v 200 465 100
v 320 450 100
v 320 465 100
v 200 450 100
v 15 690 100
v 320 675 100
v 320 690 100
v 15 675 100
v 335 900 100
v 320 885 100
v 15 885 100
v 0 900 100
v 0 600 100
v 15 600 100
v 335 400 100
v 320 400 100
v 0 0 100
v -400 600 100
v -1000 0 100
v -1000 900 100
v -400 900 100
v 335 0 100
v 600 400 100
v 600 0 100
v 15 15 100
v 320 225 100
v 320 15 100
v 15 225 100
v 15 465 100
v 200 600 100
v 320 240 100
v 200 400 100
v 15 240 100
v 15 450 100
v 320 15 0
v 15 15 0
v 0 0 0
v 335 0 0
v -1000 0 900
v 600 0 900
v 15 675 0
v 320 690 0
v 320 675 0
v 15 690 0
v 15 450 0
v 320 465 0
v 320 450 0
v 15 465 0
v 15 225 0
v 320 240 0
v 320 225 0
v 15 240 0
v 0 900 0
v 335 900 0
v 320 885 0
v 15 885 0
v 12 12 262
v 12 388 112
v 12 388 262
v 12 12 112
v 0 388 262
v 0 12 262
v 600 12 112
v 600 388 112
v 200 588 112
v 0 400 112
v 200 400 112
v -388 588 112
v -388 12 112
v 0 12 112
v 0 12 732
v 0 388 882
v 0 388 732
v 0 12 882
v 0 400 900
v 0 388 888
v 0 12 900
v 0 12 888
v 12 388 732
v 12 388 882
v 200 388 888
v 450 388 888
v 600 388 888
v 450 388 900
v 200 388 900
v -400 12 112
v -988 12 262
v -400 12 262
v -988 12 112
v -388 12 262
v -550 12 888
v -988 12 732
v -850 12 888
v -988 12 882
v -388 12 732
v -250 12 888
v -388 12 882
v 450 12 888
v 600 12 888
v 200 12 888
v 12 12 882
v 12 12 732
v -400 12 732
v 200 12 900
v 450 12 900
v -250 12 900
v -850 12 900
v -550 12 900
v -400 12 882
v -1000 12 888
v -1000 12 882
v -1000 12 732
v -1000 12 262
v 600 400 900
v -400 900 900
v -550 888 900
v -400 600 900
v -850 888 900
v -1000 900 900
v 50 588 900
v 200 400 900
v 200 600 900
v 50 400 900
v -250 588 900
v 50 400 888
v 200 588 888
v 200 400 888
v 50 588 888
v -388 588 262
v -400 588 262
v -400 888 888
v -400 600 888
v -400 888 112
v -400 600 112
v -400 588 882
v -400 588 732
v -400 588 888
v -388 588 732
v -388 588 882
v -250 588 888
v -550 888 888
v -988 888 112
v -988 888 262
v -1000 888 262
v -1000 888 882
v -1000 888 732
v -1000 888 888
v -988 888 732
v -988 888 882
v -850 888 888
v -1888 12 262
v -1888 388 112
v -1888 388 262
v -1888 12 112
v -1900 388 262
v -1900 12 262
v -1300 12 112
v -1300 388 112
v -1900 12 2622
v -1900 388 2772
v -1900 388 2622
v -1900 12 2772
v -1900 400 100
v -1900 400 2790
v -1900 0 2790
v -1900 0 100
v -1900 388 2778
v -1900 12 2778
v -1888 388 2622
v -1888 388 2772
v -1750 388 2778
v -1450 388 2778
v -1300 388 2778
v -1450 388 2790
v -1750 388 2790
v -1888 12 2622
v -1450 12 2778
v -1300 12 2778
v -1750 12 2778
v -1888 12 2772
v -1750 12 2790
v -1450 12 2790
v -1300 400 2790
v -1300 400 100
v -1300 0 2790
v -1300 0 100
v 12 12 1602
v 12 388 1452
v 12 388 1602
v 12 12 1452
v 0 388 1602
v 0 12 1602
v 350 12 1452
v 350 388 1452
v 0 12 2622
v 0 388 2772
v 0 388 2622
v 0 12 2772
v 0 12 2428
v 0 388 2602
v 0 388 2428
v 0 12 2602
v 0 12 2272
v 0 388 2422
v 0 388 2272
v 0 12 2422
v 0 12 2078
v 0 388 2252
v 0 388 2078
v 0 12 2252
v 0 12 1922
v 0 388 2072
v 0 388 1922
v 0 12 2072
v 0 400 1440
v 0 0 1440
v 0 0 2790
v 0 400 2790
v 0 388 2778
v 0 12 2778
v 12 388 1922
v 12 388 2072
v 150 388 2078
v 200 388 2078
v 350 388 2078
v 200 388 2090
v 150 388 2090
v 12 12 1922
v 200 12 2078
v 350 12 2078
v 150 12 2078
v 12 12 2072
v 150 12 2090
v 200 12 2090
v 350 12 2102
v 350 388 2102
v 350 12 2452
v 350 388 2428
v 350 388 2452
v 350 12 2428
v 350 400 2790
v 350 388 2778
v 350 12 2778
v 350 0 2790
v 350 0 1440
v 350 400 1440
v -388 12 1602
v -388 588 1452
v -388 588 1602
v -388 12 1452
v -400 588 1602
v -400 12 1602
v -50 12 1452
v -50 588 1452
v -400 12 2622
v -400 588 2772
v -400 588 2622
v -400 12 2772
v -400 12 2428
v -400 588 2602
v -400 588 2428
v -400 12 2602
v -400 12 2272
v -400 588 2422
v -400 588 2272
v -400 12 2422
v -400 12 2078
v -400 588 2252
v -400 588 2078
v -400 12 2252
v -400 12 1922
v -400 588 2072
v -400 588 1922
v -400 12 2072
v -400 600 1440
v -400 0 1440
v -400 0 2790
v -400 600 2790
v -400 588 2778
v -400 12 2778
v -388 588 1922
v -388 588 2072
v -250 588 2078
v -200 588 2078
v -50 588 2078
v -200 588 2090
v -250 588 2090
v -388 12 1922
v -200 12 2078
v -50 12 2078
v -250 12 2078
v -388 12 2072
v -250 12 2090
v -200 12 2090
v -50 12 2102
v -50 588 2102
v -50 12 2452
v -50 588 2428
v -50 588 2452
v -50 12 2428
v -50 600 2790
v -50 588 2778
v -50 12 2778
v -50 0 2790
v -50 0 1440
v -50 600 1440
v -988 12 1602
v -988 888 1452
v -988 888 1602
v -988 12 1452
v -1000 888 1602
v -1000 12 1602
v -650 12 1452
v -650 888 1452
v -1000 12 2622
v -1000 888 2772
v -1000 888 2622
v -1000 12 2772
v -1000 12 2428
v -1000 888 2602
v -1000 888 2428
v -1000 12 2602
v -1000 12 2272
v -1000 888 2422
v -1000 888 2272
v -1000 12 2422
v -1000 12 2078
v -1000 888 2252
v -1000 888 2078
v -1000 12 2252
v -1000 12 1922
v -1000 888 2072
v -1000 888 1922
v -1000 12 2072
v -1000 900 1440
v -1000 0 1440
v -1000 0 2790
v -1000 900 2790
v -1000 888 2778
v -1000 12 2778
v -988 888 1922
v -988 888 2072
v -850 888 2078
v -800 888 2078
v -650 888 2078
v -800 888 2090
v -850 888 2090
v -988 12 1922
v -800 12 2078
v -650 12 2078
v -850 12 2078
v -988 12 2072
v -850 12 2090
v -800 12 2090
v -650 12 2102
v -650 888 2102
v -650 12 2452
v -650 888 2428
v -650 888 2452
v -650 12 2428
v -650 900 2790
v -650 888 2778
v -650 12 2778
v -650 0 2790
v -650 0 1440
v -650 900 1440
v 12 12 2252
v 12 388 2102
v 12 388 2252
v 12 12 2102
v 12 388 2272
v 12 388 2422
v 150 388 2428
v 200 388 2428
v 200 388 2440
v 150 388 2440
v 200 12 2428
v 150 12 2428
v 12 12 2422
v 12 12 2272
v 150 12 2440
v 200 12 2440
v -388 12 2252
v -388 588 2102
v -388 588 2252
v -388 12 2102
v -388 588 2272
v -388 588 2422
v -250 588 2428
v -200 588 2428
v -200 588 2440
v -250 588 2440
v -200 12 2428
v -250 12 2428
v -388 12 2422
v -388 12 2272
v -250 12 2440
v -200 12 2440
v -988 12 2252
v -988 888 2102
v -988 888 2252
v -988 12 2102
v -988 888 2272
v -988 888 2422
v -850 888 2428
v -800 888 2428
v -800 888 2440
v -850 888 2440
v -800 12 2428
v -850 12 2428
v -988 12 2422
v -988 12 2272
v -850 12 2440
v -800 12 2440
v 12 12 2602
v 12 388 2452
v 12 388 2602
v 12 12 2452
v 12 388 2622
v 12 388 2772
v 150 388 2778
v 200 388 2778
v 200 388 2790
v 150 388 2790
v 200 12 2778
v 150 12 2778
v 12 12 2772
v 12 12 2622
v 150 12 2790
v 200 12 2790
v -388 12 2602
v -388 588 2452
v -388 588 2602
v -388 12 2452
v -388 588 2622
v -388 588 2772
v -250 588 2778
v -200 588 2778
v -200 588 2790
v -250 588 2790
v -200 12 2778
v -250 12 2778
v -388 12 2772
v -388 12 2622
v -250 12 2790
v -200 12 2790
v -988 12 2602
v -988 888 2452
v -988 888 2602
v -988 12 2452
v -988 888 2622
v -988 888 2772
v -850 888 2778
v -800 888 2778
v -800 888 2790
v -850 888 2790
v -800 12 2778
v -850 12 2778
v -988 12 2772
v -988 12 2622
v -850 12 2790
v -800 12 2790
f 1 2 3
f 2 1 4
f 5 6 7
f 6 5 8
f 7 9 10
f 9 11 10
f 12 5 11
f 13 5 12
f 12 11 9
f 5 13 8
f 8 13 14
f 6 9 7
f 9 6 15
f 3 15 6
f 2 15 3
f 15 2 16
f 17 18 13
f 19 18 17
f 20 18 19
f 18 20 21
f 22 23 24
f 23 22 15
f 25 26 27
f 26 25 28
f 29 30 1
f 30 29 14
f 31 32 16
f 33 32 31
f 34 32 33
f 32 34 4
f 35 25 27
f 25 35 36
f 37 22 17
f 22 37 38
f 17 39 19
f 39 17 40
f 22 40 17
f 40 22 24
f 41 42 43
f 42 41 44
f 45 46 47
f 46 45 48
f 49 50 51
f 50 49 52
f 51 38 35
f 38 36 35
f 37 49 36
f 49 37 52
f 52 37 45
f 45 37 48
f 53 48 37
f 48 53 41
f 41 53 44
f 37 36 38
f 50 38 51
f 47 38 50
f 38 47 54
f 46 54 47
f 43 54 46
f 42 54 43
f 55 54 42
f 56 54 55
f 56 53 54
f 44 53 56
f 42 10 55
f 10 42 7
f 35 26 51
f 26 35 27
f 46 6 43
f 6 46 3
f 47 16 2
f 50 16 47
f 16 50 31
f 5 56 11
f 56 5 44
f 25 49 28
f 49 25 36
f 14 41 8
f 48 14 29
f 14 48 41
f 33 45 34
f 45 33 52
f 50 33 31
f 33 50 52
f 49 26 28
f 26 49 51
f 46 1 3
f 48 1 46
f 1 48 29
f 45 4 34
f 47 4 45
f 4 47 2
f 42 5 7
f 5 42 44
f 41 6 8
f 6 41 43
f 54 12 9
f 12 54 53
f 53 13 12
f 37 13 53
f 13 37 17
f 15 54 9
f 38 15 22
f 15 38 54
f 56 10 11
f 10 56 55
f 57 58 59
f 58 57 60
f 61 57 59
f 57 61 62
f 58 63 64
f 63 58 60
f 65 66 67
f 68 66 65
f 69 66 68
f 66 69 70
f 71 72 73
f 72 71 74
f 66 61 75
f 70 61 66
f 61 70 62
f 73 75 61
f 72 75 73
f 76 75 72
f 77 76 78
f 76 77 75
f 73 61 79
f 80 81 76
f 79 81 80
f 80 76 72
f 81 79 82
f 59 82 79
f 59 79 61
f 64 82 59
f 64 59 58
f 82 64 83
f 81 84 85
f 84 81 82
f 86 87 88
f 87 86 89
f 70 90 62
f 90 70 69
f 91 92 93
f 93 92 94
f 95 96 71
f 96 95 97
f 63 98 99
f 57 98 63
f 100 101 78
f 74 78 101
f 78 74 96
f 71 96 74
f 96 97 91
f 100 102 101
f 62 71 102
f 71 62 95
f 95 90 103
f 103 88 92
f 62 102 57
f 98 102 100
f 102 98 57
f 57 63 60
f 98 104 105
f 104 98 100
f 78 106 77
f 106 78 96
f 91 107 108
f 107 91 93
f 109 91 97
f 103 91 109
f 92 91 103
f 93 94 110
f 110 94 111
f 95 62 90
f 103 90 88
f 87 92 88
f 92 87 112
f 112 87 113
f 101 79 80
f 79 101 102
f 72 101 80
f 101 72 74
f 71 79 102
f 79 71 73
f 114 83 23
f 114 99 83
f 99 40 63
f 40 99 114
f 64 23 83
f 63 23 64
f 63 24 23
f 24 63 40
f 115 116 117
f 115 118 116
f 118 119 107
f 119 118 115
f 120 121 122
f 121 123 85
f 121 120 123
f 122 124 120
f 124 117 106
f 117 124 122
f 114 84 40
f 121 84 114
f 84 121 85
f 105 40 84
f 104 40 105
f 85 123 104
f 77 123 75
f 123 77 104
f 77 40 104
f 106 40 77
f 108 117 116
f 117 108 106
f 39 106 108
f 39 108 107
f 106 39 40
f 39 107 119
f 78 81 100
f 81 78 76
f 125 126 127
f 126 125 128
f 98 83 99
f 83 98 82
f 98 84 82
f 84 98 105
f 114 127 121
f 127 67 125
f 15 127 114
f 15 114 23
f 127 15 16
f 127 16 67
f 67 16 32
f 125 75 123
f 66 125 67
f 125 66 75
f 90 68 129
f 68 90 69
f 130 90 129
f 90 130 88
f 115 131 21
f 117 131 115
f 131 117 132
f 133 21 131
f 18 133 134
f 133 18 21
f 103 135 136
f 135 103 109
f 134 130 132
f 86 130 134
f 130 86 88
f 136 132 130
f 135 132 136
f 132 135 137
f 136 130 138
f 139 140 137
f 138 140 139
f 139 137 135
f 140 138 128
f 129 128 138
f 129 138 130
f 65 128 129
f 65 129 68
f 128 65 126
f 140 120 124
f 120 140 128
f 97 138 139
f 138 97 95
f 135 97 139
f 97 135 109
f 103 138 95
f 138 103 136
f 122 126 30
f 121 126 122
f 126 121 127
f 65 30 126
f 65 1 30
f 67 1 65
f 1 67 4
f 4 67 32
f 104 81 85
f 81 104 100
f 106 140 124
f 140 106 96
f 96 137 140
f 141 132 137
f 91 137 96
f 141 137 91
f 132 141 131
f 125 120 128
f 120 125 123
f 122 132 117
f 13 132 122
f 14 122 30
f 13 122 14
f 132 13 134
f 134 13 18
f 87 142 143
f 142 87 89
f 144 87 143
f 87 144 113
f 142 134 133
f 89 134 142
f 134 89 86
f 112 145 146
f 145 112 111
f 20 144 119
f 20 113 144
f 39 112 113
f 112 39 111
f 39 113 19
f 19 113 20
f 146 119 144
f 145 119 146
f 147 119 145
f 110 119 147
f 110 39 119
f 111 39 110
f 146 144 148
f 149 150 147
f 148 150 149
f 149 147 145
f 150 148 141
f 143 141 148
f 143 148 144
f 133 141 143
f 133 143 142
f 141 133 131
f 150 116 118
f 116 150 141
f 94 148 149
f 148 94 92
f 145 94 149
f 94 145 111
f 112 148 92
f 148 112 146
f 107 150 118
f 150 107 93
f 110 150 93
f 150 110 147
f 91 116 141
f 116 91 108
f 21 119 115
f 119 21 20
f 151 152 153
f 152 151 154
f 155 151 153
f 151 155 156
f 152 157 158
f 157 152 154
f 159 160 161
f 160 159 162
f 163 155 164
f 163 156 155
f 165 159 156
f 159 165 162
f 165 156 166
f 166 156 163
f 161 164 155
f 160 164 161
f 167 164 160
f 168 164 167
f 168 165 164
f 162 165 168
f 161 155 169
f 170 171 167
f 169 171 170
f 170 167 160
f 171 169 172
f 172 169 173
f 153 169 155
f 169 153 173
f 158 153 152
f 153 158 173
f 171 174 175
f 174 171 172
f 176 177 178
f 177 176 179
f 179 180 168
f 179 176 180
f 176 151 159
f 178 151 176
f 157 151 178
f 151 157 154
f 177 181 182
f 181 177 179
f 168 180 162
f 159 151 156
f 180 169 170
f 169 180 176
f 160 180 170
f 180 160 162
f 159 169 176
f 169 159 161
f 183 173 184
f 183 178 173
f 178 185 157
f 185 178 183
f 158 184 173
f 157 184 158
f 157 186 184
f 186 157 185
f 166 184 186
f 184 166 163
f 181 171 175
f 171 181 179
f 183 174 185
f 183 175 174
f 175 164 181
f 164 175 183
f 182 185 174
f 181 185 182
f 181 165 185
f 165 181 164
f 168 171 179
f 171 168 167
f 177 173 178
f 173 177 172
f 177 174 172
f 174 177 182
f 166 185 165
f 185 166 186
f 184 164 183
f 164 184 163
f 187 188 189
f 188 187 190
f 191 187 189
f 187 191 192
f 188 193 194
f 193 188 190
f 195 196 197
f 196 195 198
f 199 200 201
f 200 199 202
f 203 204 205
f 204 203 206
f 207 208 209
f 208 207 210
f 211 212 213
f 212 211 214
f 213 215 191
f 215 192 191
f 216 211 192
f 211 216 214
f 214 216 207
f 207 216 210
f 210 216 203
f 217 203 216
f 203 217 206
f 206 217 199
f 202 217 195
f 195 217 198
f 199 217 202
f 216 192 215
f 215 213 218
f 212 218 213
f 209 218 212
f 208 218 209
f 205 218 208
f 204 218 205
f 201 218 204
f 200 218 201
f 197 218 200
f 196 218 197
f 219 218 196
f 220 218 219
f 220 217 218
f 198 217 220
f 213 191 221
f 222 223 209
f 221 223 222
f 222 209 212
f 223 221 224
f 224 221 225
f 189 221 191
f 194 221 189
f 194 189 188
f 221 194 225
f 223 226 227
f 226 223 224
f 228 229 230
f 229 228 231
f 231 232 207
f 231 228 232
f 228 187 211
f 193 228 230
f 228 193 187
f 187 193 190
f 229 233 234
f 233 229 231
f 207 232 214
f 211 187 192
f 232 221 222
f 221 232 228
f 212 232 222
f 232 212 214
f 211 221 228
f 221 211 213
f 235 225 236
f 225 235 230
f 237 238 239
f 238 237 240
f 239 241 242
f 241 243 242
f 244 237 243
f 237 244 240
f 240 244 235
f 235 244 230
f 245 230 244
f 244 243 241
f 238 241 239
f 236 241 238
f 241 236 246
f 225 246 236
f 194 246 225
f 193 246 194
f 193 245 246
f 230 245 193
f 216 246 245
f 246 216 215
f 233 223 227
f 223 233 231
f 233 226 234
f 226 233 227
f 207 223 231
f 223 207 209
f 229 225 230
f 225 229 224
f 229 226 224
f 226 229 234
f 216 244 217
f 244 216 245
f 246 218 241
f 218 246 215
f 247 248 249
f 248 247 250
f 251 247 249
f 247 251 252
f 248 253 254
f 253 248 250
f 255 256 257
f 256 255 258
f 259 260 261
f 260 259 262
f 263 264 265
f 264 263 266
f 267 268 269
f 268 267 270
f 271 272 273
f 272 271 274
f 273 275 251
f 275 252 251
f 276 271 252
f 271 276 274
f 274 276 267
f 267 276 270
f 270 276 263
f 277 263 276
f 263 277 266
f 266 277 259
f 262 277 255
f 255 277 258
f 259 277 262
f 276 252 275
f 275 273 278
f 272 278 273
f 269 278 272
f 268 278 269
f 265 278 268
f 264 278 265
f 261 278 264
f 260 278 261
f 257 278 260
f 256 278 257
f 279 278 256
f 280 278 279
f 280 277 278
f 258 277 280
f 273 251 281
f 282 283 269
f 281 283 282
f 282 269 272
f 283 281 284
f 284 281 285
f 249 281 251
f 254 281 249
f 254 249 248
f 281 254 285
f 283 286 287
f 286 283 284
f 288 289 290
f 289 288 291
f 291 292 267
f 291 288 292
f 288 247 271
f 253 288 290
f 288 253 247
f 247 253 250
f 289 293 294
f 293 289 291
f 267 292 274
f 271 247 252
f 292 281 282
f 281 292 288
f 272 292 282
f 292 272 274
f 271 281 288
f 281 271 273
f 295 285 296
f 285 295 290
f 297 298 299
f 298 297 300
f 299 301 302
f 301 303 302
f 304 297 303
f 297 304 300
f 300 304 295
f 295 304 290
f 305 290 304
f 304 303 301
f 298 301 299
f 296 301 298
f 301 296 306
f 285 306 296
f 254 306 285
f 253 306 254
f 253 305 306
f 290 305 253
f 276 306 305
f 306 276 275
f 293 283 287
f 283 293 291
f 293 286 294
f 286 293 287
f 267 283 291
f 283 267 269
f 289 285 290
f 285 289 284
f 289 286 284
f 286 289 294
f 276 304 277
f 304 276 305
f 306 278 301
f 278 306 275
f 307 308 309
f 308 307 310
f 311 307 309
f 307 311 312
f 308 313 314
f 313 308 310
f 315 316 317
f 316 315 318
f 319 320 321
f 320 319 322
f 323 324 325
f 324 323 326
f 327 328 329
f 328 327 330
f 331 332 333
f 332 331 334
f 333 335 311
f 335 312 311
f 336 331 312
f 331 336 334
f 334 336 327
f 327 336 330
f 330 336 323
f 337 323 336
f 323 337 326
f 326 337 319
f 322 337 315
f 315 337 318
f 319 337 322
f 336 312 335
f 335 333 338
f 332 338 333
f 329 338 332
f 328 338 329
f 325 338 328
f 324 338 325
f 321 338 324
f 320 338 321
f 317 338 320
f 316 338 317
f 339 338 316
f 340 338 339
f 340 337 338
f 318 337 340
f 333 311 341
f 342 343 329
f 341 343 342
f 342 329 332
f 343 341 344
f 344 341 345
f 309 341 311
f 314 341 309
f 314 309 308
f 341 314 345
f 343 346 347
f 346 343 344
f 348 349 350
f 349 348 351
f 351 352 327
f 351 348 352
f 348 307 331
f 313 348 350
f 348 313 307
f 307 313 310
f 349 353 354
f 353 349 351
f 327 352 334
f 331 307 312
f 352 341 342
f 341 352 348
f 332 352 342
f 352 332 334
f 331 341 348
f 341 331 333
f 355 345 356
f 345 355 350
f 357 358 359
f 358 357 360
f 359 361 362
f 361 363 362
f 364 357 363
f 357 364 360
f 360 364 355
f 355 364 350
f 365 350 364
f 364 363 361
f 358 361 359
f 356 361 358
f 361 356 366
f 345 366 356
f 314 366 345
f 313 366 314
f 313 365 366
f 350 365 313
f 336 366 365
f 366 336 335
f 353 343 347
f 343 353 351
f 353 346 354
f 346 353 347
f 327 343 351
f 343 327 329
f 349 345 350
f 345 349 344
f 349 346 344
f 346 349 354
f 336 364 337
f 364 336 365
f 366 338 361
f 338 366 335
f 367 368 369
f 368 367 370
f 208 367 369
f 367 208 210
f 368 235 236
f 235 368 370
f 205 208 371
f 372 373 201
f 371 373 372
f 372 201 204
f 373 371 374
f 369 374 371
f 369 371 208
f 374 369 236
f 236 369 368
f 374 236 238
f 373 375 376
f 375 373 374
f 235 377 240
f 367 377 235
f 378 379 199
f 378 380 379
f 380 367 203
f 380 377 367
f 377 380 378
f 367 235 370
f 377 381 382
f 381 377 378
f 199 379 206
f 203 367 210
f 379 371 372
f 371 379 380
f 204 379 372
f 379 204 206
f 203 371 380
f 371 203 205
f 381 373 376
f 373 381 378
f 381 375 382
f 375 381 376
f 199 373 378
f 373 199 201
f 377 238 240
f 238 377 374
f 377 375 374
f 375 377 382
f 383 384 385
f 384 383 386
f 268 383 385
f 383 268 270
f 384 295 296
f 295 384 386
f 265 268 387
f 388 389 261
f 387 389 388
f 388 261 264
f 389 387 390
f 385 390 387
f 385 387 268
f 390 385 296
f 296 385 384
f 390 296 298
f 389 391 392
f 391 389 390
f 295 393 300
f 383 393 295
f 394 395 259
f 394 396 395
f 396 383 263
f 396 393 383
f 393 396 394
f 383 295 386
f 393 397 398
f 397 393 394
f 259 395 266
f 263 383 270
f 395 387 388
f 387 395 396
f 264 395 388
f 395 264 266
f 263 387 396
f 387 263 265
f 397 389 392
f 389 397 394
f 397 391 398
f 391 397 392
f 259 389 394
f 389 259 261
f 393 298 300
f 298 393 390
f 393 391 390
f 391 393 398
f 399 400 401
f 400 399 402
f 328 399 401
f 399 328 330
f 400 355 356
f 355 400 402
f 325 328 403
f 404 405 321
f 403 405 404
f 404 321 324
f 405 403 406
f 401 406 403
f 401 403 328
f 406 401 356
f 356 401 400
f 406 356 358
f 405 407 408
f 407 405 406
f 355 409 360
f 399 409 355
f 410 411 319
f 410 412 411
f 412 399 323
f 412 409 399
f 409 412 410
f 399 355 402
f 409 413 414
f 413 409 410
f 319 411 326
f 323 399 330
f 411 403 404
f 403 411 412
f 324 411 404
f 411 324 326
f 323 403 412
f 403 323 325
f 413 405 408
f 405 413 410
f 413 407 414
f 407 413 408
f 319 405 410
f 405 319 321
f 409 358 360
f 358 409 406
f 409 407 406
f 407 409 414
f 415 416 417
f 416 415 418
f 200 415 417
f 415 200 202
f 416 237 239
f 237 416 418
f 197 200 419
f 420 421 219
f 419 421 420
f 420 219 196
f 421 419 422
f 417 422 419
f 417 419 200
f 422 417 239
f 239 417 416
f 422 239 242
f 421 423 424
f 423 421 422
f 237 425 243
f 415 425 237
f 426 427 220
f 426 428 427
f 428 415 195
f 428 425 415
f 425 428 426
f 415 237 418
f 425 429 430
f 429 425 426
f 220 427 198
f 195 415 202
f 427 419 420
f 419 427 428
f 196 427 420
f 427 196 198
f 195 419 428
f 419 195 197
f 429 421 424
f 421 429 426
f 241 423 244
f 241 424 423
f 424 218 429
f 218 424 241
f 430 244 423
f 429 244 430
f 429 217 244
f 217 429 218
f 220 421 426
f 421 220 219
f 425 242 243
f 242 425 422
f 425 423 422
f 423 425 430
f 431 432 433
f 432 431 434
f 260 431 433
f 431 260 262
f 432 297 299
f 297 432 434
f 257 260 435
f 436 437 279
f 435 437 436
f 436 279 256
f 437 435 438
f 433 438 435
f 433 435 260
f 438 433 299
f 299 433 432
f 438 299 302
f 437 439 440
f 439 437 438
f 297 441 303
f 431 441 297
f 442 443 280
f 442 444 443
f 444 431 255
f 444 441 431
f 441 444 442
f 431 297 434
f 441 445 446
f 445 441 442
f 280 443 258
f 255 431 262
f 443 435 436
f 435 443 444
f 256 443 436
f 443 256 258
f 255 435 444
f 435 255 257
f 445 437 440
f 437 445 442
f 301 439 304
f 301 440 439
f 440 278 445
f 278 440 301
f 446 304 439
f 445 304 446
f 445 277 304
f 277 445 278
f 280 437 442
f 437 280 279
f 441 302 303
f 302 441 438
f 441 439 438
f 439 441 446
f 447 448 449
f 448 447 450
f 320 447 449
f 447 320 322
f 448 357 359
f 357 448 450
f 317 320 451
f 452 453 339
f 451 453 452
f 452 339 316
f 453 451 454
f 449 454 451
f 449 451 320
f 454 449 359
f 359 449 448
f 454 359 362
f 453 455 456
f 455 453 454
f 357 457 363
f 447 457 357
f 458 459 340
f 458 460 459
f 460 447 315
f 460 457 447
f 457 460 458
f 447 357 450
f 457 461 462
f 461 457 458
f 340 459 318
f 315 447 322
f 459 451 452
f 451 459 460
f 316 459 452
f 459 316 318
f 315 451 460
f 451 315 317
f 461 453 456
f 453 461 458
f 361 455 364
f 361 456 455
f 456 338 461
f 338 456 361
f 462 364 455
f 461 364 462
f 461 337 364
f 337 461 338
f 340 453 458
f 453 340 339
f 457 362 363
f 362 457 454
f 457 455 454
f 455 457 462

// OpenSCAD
use <CajoneriaLib.scad>
// definicion de medidas de muebles
// Modular Bajo
espesor=15;
anchoM=0;
altoM=1;
profM=2;

// Medidas modulos 
Mod_1 = [400, 800, 600];
Mod_2 = [600, 800, 600];
Mod_3 = [900, 800, 600];
Mod_4 = [400, 2690, 600];
// Cajoneria alta primer nivel
Mod_11 = [400, 650, 350];
Mod_12 = [600, 650, 350];
Mod_13 = [900, 650, 350];
// Cajoneria alta segundo nivel
Mod_21 = [400, 350, 350];
Mod_22 = [600, 350, 350];
Mod_23 = [900, 350, 350];
// Cajoneria alta tercer nivel
Mod_31 = [400, 350, 350];
Mod_32 = [600, 350, 350];
Mod_33 = [900, 350, 350];
// Lista de modulos
Modulos = [
    Mod_1,Mod_2,Mod_3,Mod_4,
    Mod_11,Mod_12,Mod_13,
    Mod_21,Mod_22,Mod_23,
    Mod_31,Mod_32,Mod_33 ];

anchoRiel=13*2;
altoZocalo=100;
alturaModAlto=1440;

// Posiciones modulos
PMod_1=[0,0,altoZocalo];
PMod_2=[-Mod_1[anchoM],0,altoZocalo];
PMod_3=[-Mod_1[anchoM]-Mod_2[anchoM],0,altoZocalo];
PMod_4=[-Mod_1[anchoM]-Mod_2[anchoM]-Mod_3[anchoM],0,altoZocalo];

//Posiciones de Modulos Cajoneria Alta primer nivel
PMod_11=[0,0,alturaModAlto];
PMod_12=[-Mod_11[anchoM],0,alturaModAlto];
PMod_13=[-Mod_11[anchoM]-Mod_12[anchoM],0,alturaModAlto];    
//Posiciones de Modulos Cajoneria Alta segundo nivel
PMod_21=[0,0,alturaModAlto+Mod_11[1]];
PMod_22=[-Mod_21[anchoM],0,alturaModAlto+Mod_11[1]];
PMod_23=[-Mod_21[anchoM]-Mod_22[anchoM],0,alturaModAlto+Mod_11[1]];
//Posiciones de Modulos Cajoneria Alta tercer nivel
PMod_31=[0,0,alturaModAlto+Mod_11[1]+Mod_21[1]];
PMod_32=[-Mod_31[anchoM],0,alturaModAlto+Mod_11[1]+Mod_21[1]];
PMod_33=[-Mod_21[anchoM]-Mod_22[anchoM],0,alturaModAlto+Mod_11[1]+Mod_21[1]];

// Lista de posiciones de modulos
Pos_Modulos = [
    PMod_1,PMod_2,PMod_3,PMod_4,
    PMod_11,PMod_12,PMod_13,
    PMod_21,PMod_22,PMod_23,
    PMod_31,PMod_32,PMod_33,
    ];

altoCajon=200;
separaCajon=40;
altoCajonDelgado=80;

// Divisiones 
Pos_Modulos_divH =[
    [3,[PMod_4[0]-espesor,PMod_4[1],PMod_4[2]+800]],
    [3,[PMod_4[0]-espesor,PMod_4[1],PMod_4[2]+1072]],
    [3,[PMod_4[0]-espesor,PMod_4[1],PMod_4[2]+1345]],
    [3,[PMod_4[0]-espesor,PMod_4[1],PMod_4[2]+1665]],
    [3,[PMod_4[0]-espesor,PMod_4[1],PMod_4[2]+1980]],
    [3,[PMod_4[0]-espesor,PMod_4[1],PMod_4[2]+2330]],
    [4,[PMod_11[0]-espesor,PMod_11[1],alturaModAlto+Mod_11[1]/2]],
    [5,[PMod_12[0]-espesor,PMod_12[1],alturaModAlto+Mod_12[1]/2]],
    [6,[PMod_13[0]-espesor,PMod_13[1],alturaModAlto+Mod_13[1]/2]]
    ];

// Posiciones cajones
Pcajon_11 = [0-anchoRiel-2,50,altoZocalo+espesor+10];
Pcajon_12 = [0-anchoRiel-2,50,altoZocalo+espesor+altoCajon+separaCajon+10];
Pcajon_13 = [0-anchoRiel-2,50,altoZocalo+espesor+altoCajon*2+separaCajon*2+10];
Pcajon_21 = [-Mod_1[anchoM]-anchoRiel-2,50,altoZocalo+espesor+10];
Pcajon_22 = [-Mod_1[anchoM]-anchoRiel-2,50,altoZocalo+espesor+altoCajon+separaCajon+10];
Pcajon_23 = [-Mod_1[anchoM]-anchoRiel-2,50,altoZocalo+espesor+altoCajon*2+separaCajon*2+10];
Pcajon_24 = [-Mod_1[anchoM]-anchoRiel-2,50,altoZocalo+espesor+altoCajon*2+altoCajonDelgado+separaCajon*3+10];
Pcajon_31 = [-Mod_1[anchoM]-Mod_2[anchoM]-anchoRiel-2,50,altoZocalo+espesor+10];
Pcajon_32 = [-Mod_1[anchoM]-Mod_2[anchoM]-anchoRiel-2,50,altoZocalo+espesor+altoCajon+separaCajon+10];
Pcajon_33 = [-Mod_1[anchoM]-Mod_2[anchoM]-anchoRiel-2,50,altoZocalo+espesor+altoCajon*2+separaCajon*2+10];
Pcajon_41 = [-Mod_1[anchoM]-Mod_2[anchoM]-Mod_3[anchoM]-anchoRiel-2,50,altoZocalo+espesor+10];
Pcajon_42 = [-Mod_1[anchoM]-Mod_2[anchoM]-Mod_3[anchoM]-anchoRiel-2,50,altoZocalo+espesor+altoCajon+separaCajon+10];
Pcajon_43 = [-Mod_1[anchoM]-Mod_2[anchoM]-Mod_3[anchoM]-anchoRiel-2,50,altoZocalo+espesor+altoCajon*2+separaCajon*2+10];
Pcajon_44 = [-Mod_1[anchoM]-Mod_2[anchoM]-Mod_3[anchoM]-anchoRiel-2,50,altoZocalo+espesor+altoCajon*3+separaCajon*3+10];

//Pos_Cajones =[
//          [indexModulo,Pos_Cajon,AltoCajon],
//          [indexModulo,Pos_Cajon,AltoCajon],
//]
// Lista de Cajones
Pos_Cajones = [
    [0,Pcajon_11,altoCajon],[0,Pcajon_12,altoCajon],[0,Pcajon_13,altoCajon],
    [1,Pcajon_21,altoCajon],[1,Pcajon_22,altoCajon],[1,Pcajon_23,altoCajonDelgado],[1,Pcajon_24,altoCajonDelgado],
    [2,Pcajon_31,altoCajon],[2,Pcajon_32,altoCajon],[2,Pcajon_33,altoCajon],
    [3,Pcajon_41,altoCajon],[3,Pcajon_42,altoCajon],[3,Pcajon_43,altoCajon],[3,Pcajon_44,altoCajon]
    ];

//paredes2();
//socalo(Ar_ancho, Ar_alto, Ar_profundo, espesor, div=10,espacio=240)
socalo(350, 900, 100, 15, 5, 200);

modulosdeCocina(Modulos, Pos_Modulos, 12, Pos_Cajones, 12, Pos_Modulos_divH, 8, espesor);
